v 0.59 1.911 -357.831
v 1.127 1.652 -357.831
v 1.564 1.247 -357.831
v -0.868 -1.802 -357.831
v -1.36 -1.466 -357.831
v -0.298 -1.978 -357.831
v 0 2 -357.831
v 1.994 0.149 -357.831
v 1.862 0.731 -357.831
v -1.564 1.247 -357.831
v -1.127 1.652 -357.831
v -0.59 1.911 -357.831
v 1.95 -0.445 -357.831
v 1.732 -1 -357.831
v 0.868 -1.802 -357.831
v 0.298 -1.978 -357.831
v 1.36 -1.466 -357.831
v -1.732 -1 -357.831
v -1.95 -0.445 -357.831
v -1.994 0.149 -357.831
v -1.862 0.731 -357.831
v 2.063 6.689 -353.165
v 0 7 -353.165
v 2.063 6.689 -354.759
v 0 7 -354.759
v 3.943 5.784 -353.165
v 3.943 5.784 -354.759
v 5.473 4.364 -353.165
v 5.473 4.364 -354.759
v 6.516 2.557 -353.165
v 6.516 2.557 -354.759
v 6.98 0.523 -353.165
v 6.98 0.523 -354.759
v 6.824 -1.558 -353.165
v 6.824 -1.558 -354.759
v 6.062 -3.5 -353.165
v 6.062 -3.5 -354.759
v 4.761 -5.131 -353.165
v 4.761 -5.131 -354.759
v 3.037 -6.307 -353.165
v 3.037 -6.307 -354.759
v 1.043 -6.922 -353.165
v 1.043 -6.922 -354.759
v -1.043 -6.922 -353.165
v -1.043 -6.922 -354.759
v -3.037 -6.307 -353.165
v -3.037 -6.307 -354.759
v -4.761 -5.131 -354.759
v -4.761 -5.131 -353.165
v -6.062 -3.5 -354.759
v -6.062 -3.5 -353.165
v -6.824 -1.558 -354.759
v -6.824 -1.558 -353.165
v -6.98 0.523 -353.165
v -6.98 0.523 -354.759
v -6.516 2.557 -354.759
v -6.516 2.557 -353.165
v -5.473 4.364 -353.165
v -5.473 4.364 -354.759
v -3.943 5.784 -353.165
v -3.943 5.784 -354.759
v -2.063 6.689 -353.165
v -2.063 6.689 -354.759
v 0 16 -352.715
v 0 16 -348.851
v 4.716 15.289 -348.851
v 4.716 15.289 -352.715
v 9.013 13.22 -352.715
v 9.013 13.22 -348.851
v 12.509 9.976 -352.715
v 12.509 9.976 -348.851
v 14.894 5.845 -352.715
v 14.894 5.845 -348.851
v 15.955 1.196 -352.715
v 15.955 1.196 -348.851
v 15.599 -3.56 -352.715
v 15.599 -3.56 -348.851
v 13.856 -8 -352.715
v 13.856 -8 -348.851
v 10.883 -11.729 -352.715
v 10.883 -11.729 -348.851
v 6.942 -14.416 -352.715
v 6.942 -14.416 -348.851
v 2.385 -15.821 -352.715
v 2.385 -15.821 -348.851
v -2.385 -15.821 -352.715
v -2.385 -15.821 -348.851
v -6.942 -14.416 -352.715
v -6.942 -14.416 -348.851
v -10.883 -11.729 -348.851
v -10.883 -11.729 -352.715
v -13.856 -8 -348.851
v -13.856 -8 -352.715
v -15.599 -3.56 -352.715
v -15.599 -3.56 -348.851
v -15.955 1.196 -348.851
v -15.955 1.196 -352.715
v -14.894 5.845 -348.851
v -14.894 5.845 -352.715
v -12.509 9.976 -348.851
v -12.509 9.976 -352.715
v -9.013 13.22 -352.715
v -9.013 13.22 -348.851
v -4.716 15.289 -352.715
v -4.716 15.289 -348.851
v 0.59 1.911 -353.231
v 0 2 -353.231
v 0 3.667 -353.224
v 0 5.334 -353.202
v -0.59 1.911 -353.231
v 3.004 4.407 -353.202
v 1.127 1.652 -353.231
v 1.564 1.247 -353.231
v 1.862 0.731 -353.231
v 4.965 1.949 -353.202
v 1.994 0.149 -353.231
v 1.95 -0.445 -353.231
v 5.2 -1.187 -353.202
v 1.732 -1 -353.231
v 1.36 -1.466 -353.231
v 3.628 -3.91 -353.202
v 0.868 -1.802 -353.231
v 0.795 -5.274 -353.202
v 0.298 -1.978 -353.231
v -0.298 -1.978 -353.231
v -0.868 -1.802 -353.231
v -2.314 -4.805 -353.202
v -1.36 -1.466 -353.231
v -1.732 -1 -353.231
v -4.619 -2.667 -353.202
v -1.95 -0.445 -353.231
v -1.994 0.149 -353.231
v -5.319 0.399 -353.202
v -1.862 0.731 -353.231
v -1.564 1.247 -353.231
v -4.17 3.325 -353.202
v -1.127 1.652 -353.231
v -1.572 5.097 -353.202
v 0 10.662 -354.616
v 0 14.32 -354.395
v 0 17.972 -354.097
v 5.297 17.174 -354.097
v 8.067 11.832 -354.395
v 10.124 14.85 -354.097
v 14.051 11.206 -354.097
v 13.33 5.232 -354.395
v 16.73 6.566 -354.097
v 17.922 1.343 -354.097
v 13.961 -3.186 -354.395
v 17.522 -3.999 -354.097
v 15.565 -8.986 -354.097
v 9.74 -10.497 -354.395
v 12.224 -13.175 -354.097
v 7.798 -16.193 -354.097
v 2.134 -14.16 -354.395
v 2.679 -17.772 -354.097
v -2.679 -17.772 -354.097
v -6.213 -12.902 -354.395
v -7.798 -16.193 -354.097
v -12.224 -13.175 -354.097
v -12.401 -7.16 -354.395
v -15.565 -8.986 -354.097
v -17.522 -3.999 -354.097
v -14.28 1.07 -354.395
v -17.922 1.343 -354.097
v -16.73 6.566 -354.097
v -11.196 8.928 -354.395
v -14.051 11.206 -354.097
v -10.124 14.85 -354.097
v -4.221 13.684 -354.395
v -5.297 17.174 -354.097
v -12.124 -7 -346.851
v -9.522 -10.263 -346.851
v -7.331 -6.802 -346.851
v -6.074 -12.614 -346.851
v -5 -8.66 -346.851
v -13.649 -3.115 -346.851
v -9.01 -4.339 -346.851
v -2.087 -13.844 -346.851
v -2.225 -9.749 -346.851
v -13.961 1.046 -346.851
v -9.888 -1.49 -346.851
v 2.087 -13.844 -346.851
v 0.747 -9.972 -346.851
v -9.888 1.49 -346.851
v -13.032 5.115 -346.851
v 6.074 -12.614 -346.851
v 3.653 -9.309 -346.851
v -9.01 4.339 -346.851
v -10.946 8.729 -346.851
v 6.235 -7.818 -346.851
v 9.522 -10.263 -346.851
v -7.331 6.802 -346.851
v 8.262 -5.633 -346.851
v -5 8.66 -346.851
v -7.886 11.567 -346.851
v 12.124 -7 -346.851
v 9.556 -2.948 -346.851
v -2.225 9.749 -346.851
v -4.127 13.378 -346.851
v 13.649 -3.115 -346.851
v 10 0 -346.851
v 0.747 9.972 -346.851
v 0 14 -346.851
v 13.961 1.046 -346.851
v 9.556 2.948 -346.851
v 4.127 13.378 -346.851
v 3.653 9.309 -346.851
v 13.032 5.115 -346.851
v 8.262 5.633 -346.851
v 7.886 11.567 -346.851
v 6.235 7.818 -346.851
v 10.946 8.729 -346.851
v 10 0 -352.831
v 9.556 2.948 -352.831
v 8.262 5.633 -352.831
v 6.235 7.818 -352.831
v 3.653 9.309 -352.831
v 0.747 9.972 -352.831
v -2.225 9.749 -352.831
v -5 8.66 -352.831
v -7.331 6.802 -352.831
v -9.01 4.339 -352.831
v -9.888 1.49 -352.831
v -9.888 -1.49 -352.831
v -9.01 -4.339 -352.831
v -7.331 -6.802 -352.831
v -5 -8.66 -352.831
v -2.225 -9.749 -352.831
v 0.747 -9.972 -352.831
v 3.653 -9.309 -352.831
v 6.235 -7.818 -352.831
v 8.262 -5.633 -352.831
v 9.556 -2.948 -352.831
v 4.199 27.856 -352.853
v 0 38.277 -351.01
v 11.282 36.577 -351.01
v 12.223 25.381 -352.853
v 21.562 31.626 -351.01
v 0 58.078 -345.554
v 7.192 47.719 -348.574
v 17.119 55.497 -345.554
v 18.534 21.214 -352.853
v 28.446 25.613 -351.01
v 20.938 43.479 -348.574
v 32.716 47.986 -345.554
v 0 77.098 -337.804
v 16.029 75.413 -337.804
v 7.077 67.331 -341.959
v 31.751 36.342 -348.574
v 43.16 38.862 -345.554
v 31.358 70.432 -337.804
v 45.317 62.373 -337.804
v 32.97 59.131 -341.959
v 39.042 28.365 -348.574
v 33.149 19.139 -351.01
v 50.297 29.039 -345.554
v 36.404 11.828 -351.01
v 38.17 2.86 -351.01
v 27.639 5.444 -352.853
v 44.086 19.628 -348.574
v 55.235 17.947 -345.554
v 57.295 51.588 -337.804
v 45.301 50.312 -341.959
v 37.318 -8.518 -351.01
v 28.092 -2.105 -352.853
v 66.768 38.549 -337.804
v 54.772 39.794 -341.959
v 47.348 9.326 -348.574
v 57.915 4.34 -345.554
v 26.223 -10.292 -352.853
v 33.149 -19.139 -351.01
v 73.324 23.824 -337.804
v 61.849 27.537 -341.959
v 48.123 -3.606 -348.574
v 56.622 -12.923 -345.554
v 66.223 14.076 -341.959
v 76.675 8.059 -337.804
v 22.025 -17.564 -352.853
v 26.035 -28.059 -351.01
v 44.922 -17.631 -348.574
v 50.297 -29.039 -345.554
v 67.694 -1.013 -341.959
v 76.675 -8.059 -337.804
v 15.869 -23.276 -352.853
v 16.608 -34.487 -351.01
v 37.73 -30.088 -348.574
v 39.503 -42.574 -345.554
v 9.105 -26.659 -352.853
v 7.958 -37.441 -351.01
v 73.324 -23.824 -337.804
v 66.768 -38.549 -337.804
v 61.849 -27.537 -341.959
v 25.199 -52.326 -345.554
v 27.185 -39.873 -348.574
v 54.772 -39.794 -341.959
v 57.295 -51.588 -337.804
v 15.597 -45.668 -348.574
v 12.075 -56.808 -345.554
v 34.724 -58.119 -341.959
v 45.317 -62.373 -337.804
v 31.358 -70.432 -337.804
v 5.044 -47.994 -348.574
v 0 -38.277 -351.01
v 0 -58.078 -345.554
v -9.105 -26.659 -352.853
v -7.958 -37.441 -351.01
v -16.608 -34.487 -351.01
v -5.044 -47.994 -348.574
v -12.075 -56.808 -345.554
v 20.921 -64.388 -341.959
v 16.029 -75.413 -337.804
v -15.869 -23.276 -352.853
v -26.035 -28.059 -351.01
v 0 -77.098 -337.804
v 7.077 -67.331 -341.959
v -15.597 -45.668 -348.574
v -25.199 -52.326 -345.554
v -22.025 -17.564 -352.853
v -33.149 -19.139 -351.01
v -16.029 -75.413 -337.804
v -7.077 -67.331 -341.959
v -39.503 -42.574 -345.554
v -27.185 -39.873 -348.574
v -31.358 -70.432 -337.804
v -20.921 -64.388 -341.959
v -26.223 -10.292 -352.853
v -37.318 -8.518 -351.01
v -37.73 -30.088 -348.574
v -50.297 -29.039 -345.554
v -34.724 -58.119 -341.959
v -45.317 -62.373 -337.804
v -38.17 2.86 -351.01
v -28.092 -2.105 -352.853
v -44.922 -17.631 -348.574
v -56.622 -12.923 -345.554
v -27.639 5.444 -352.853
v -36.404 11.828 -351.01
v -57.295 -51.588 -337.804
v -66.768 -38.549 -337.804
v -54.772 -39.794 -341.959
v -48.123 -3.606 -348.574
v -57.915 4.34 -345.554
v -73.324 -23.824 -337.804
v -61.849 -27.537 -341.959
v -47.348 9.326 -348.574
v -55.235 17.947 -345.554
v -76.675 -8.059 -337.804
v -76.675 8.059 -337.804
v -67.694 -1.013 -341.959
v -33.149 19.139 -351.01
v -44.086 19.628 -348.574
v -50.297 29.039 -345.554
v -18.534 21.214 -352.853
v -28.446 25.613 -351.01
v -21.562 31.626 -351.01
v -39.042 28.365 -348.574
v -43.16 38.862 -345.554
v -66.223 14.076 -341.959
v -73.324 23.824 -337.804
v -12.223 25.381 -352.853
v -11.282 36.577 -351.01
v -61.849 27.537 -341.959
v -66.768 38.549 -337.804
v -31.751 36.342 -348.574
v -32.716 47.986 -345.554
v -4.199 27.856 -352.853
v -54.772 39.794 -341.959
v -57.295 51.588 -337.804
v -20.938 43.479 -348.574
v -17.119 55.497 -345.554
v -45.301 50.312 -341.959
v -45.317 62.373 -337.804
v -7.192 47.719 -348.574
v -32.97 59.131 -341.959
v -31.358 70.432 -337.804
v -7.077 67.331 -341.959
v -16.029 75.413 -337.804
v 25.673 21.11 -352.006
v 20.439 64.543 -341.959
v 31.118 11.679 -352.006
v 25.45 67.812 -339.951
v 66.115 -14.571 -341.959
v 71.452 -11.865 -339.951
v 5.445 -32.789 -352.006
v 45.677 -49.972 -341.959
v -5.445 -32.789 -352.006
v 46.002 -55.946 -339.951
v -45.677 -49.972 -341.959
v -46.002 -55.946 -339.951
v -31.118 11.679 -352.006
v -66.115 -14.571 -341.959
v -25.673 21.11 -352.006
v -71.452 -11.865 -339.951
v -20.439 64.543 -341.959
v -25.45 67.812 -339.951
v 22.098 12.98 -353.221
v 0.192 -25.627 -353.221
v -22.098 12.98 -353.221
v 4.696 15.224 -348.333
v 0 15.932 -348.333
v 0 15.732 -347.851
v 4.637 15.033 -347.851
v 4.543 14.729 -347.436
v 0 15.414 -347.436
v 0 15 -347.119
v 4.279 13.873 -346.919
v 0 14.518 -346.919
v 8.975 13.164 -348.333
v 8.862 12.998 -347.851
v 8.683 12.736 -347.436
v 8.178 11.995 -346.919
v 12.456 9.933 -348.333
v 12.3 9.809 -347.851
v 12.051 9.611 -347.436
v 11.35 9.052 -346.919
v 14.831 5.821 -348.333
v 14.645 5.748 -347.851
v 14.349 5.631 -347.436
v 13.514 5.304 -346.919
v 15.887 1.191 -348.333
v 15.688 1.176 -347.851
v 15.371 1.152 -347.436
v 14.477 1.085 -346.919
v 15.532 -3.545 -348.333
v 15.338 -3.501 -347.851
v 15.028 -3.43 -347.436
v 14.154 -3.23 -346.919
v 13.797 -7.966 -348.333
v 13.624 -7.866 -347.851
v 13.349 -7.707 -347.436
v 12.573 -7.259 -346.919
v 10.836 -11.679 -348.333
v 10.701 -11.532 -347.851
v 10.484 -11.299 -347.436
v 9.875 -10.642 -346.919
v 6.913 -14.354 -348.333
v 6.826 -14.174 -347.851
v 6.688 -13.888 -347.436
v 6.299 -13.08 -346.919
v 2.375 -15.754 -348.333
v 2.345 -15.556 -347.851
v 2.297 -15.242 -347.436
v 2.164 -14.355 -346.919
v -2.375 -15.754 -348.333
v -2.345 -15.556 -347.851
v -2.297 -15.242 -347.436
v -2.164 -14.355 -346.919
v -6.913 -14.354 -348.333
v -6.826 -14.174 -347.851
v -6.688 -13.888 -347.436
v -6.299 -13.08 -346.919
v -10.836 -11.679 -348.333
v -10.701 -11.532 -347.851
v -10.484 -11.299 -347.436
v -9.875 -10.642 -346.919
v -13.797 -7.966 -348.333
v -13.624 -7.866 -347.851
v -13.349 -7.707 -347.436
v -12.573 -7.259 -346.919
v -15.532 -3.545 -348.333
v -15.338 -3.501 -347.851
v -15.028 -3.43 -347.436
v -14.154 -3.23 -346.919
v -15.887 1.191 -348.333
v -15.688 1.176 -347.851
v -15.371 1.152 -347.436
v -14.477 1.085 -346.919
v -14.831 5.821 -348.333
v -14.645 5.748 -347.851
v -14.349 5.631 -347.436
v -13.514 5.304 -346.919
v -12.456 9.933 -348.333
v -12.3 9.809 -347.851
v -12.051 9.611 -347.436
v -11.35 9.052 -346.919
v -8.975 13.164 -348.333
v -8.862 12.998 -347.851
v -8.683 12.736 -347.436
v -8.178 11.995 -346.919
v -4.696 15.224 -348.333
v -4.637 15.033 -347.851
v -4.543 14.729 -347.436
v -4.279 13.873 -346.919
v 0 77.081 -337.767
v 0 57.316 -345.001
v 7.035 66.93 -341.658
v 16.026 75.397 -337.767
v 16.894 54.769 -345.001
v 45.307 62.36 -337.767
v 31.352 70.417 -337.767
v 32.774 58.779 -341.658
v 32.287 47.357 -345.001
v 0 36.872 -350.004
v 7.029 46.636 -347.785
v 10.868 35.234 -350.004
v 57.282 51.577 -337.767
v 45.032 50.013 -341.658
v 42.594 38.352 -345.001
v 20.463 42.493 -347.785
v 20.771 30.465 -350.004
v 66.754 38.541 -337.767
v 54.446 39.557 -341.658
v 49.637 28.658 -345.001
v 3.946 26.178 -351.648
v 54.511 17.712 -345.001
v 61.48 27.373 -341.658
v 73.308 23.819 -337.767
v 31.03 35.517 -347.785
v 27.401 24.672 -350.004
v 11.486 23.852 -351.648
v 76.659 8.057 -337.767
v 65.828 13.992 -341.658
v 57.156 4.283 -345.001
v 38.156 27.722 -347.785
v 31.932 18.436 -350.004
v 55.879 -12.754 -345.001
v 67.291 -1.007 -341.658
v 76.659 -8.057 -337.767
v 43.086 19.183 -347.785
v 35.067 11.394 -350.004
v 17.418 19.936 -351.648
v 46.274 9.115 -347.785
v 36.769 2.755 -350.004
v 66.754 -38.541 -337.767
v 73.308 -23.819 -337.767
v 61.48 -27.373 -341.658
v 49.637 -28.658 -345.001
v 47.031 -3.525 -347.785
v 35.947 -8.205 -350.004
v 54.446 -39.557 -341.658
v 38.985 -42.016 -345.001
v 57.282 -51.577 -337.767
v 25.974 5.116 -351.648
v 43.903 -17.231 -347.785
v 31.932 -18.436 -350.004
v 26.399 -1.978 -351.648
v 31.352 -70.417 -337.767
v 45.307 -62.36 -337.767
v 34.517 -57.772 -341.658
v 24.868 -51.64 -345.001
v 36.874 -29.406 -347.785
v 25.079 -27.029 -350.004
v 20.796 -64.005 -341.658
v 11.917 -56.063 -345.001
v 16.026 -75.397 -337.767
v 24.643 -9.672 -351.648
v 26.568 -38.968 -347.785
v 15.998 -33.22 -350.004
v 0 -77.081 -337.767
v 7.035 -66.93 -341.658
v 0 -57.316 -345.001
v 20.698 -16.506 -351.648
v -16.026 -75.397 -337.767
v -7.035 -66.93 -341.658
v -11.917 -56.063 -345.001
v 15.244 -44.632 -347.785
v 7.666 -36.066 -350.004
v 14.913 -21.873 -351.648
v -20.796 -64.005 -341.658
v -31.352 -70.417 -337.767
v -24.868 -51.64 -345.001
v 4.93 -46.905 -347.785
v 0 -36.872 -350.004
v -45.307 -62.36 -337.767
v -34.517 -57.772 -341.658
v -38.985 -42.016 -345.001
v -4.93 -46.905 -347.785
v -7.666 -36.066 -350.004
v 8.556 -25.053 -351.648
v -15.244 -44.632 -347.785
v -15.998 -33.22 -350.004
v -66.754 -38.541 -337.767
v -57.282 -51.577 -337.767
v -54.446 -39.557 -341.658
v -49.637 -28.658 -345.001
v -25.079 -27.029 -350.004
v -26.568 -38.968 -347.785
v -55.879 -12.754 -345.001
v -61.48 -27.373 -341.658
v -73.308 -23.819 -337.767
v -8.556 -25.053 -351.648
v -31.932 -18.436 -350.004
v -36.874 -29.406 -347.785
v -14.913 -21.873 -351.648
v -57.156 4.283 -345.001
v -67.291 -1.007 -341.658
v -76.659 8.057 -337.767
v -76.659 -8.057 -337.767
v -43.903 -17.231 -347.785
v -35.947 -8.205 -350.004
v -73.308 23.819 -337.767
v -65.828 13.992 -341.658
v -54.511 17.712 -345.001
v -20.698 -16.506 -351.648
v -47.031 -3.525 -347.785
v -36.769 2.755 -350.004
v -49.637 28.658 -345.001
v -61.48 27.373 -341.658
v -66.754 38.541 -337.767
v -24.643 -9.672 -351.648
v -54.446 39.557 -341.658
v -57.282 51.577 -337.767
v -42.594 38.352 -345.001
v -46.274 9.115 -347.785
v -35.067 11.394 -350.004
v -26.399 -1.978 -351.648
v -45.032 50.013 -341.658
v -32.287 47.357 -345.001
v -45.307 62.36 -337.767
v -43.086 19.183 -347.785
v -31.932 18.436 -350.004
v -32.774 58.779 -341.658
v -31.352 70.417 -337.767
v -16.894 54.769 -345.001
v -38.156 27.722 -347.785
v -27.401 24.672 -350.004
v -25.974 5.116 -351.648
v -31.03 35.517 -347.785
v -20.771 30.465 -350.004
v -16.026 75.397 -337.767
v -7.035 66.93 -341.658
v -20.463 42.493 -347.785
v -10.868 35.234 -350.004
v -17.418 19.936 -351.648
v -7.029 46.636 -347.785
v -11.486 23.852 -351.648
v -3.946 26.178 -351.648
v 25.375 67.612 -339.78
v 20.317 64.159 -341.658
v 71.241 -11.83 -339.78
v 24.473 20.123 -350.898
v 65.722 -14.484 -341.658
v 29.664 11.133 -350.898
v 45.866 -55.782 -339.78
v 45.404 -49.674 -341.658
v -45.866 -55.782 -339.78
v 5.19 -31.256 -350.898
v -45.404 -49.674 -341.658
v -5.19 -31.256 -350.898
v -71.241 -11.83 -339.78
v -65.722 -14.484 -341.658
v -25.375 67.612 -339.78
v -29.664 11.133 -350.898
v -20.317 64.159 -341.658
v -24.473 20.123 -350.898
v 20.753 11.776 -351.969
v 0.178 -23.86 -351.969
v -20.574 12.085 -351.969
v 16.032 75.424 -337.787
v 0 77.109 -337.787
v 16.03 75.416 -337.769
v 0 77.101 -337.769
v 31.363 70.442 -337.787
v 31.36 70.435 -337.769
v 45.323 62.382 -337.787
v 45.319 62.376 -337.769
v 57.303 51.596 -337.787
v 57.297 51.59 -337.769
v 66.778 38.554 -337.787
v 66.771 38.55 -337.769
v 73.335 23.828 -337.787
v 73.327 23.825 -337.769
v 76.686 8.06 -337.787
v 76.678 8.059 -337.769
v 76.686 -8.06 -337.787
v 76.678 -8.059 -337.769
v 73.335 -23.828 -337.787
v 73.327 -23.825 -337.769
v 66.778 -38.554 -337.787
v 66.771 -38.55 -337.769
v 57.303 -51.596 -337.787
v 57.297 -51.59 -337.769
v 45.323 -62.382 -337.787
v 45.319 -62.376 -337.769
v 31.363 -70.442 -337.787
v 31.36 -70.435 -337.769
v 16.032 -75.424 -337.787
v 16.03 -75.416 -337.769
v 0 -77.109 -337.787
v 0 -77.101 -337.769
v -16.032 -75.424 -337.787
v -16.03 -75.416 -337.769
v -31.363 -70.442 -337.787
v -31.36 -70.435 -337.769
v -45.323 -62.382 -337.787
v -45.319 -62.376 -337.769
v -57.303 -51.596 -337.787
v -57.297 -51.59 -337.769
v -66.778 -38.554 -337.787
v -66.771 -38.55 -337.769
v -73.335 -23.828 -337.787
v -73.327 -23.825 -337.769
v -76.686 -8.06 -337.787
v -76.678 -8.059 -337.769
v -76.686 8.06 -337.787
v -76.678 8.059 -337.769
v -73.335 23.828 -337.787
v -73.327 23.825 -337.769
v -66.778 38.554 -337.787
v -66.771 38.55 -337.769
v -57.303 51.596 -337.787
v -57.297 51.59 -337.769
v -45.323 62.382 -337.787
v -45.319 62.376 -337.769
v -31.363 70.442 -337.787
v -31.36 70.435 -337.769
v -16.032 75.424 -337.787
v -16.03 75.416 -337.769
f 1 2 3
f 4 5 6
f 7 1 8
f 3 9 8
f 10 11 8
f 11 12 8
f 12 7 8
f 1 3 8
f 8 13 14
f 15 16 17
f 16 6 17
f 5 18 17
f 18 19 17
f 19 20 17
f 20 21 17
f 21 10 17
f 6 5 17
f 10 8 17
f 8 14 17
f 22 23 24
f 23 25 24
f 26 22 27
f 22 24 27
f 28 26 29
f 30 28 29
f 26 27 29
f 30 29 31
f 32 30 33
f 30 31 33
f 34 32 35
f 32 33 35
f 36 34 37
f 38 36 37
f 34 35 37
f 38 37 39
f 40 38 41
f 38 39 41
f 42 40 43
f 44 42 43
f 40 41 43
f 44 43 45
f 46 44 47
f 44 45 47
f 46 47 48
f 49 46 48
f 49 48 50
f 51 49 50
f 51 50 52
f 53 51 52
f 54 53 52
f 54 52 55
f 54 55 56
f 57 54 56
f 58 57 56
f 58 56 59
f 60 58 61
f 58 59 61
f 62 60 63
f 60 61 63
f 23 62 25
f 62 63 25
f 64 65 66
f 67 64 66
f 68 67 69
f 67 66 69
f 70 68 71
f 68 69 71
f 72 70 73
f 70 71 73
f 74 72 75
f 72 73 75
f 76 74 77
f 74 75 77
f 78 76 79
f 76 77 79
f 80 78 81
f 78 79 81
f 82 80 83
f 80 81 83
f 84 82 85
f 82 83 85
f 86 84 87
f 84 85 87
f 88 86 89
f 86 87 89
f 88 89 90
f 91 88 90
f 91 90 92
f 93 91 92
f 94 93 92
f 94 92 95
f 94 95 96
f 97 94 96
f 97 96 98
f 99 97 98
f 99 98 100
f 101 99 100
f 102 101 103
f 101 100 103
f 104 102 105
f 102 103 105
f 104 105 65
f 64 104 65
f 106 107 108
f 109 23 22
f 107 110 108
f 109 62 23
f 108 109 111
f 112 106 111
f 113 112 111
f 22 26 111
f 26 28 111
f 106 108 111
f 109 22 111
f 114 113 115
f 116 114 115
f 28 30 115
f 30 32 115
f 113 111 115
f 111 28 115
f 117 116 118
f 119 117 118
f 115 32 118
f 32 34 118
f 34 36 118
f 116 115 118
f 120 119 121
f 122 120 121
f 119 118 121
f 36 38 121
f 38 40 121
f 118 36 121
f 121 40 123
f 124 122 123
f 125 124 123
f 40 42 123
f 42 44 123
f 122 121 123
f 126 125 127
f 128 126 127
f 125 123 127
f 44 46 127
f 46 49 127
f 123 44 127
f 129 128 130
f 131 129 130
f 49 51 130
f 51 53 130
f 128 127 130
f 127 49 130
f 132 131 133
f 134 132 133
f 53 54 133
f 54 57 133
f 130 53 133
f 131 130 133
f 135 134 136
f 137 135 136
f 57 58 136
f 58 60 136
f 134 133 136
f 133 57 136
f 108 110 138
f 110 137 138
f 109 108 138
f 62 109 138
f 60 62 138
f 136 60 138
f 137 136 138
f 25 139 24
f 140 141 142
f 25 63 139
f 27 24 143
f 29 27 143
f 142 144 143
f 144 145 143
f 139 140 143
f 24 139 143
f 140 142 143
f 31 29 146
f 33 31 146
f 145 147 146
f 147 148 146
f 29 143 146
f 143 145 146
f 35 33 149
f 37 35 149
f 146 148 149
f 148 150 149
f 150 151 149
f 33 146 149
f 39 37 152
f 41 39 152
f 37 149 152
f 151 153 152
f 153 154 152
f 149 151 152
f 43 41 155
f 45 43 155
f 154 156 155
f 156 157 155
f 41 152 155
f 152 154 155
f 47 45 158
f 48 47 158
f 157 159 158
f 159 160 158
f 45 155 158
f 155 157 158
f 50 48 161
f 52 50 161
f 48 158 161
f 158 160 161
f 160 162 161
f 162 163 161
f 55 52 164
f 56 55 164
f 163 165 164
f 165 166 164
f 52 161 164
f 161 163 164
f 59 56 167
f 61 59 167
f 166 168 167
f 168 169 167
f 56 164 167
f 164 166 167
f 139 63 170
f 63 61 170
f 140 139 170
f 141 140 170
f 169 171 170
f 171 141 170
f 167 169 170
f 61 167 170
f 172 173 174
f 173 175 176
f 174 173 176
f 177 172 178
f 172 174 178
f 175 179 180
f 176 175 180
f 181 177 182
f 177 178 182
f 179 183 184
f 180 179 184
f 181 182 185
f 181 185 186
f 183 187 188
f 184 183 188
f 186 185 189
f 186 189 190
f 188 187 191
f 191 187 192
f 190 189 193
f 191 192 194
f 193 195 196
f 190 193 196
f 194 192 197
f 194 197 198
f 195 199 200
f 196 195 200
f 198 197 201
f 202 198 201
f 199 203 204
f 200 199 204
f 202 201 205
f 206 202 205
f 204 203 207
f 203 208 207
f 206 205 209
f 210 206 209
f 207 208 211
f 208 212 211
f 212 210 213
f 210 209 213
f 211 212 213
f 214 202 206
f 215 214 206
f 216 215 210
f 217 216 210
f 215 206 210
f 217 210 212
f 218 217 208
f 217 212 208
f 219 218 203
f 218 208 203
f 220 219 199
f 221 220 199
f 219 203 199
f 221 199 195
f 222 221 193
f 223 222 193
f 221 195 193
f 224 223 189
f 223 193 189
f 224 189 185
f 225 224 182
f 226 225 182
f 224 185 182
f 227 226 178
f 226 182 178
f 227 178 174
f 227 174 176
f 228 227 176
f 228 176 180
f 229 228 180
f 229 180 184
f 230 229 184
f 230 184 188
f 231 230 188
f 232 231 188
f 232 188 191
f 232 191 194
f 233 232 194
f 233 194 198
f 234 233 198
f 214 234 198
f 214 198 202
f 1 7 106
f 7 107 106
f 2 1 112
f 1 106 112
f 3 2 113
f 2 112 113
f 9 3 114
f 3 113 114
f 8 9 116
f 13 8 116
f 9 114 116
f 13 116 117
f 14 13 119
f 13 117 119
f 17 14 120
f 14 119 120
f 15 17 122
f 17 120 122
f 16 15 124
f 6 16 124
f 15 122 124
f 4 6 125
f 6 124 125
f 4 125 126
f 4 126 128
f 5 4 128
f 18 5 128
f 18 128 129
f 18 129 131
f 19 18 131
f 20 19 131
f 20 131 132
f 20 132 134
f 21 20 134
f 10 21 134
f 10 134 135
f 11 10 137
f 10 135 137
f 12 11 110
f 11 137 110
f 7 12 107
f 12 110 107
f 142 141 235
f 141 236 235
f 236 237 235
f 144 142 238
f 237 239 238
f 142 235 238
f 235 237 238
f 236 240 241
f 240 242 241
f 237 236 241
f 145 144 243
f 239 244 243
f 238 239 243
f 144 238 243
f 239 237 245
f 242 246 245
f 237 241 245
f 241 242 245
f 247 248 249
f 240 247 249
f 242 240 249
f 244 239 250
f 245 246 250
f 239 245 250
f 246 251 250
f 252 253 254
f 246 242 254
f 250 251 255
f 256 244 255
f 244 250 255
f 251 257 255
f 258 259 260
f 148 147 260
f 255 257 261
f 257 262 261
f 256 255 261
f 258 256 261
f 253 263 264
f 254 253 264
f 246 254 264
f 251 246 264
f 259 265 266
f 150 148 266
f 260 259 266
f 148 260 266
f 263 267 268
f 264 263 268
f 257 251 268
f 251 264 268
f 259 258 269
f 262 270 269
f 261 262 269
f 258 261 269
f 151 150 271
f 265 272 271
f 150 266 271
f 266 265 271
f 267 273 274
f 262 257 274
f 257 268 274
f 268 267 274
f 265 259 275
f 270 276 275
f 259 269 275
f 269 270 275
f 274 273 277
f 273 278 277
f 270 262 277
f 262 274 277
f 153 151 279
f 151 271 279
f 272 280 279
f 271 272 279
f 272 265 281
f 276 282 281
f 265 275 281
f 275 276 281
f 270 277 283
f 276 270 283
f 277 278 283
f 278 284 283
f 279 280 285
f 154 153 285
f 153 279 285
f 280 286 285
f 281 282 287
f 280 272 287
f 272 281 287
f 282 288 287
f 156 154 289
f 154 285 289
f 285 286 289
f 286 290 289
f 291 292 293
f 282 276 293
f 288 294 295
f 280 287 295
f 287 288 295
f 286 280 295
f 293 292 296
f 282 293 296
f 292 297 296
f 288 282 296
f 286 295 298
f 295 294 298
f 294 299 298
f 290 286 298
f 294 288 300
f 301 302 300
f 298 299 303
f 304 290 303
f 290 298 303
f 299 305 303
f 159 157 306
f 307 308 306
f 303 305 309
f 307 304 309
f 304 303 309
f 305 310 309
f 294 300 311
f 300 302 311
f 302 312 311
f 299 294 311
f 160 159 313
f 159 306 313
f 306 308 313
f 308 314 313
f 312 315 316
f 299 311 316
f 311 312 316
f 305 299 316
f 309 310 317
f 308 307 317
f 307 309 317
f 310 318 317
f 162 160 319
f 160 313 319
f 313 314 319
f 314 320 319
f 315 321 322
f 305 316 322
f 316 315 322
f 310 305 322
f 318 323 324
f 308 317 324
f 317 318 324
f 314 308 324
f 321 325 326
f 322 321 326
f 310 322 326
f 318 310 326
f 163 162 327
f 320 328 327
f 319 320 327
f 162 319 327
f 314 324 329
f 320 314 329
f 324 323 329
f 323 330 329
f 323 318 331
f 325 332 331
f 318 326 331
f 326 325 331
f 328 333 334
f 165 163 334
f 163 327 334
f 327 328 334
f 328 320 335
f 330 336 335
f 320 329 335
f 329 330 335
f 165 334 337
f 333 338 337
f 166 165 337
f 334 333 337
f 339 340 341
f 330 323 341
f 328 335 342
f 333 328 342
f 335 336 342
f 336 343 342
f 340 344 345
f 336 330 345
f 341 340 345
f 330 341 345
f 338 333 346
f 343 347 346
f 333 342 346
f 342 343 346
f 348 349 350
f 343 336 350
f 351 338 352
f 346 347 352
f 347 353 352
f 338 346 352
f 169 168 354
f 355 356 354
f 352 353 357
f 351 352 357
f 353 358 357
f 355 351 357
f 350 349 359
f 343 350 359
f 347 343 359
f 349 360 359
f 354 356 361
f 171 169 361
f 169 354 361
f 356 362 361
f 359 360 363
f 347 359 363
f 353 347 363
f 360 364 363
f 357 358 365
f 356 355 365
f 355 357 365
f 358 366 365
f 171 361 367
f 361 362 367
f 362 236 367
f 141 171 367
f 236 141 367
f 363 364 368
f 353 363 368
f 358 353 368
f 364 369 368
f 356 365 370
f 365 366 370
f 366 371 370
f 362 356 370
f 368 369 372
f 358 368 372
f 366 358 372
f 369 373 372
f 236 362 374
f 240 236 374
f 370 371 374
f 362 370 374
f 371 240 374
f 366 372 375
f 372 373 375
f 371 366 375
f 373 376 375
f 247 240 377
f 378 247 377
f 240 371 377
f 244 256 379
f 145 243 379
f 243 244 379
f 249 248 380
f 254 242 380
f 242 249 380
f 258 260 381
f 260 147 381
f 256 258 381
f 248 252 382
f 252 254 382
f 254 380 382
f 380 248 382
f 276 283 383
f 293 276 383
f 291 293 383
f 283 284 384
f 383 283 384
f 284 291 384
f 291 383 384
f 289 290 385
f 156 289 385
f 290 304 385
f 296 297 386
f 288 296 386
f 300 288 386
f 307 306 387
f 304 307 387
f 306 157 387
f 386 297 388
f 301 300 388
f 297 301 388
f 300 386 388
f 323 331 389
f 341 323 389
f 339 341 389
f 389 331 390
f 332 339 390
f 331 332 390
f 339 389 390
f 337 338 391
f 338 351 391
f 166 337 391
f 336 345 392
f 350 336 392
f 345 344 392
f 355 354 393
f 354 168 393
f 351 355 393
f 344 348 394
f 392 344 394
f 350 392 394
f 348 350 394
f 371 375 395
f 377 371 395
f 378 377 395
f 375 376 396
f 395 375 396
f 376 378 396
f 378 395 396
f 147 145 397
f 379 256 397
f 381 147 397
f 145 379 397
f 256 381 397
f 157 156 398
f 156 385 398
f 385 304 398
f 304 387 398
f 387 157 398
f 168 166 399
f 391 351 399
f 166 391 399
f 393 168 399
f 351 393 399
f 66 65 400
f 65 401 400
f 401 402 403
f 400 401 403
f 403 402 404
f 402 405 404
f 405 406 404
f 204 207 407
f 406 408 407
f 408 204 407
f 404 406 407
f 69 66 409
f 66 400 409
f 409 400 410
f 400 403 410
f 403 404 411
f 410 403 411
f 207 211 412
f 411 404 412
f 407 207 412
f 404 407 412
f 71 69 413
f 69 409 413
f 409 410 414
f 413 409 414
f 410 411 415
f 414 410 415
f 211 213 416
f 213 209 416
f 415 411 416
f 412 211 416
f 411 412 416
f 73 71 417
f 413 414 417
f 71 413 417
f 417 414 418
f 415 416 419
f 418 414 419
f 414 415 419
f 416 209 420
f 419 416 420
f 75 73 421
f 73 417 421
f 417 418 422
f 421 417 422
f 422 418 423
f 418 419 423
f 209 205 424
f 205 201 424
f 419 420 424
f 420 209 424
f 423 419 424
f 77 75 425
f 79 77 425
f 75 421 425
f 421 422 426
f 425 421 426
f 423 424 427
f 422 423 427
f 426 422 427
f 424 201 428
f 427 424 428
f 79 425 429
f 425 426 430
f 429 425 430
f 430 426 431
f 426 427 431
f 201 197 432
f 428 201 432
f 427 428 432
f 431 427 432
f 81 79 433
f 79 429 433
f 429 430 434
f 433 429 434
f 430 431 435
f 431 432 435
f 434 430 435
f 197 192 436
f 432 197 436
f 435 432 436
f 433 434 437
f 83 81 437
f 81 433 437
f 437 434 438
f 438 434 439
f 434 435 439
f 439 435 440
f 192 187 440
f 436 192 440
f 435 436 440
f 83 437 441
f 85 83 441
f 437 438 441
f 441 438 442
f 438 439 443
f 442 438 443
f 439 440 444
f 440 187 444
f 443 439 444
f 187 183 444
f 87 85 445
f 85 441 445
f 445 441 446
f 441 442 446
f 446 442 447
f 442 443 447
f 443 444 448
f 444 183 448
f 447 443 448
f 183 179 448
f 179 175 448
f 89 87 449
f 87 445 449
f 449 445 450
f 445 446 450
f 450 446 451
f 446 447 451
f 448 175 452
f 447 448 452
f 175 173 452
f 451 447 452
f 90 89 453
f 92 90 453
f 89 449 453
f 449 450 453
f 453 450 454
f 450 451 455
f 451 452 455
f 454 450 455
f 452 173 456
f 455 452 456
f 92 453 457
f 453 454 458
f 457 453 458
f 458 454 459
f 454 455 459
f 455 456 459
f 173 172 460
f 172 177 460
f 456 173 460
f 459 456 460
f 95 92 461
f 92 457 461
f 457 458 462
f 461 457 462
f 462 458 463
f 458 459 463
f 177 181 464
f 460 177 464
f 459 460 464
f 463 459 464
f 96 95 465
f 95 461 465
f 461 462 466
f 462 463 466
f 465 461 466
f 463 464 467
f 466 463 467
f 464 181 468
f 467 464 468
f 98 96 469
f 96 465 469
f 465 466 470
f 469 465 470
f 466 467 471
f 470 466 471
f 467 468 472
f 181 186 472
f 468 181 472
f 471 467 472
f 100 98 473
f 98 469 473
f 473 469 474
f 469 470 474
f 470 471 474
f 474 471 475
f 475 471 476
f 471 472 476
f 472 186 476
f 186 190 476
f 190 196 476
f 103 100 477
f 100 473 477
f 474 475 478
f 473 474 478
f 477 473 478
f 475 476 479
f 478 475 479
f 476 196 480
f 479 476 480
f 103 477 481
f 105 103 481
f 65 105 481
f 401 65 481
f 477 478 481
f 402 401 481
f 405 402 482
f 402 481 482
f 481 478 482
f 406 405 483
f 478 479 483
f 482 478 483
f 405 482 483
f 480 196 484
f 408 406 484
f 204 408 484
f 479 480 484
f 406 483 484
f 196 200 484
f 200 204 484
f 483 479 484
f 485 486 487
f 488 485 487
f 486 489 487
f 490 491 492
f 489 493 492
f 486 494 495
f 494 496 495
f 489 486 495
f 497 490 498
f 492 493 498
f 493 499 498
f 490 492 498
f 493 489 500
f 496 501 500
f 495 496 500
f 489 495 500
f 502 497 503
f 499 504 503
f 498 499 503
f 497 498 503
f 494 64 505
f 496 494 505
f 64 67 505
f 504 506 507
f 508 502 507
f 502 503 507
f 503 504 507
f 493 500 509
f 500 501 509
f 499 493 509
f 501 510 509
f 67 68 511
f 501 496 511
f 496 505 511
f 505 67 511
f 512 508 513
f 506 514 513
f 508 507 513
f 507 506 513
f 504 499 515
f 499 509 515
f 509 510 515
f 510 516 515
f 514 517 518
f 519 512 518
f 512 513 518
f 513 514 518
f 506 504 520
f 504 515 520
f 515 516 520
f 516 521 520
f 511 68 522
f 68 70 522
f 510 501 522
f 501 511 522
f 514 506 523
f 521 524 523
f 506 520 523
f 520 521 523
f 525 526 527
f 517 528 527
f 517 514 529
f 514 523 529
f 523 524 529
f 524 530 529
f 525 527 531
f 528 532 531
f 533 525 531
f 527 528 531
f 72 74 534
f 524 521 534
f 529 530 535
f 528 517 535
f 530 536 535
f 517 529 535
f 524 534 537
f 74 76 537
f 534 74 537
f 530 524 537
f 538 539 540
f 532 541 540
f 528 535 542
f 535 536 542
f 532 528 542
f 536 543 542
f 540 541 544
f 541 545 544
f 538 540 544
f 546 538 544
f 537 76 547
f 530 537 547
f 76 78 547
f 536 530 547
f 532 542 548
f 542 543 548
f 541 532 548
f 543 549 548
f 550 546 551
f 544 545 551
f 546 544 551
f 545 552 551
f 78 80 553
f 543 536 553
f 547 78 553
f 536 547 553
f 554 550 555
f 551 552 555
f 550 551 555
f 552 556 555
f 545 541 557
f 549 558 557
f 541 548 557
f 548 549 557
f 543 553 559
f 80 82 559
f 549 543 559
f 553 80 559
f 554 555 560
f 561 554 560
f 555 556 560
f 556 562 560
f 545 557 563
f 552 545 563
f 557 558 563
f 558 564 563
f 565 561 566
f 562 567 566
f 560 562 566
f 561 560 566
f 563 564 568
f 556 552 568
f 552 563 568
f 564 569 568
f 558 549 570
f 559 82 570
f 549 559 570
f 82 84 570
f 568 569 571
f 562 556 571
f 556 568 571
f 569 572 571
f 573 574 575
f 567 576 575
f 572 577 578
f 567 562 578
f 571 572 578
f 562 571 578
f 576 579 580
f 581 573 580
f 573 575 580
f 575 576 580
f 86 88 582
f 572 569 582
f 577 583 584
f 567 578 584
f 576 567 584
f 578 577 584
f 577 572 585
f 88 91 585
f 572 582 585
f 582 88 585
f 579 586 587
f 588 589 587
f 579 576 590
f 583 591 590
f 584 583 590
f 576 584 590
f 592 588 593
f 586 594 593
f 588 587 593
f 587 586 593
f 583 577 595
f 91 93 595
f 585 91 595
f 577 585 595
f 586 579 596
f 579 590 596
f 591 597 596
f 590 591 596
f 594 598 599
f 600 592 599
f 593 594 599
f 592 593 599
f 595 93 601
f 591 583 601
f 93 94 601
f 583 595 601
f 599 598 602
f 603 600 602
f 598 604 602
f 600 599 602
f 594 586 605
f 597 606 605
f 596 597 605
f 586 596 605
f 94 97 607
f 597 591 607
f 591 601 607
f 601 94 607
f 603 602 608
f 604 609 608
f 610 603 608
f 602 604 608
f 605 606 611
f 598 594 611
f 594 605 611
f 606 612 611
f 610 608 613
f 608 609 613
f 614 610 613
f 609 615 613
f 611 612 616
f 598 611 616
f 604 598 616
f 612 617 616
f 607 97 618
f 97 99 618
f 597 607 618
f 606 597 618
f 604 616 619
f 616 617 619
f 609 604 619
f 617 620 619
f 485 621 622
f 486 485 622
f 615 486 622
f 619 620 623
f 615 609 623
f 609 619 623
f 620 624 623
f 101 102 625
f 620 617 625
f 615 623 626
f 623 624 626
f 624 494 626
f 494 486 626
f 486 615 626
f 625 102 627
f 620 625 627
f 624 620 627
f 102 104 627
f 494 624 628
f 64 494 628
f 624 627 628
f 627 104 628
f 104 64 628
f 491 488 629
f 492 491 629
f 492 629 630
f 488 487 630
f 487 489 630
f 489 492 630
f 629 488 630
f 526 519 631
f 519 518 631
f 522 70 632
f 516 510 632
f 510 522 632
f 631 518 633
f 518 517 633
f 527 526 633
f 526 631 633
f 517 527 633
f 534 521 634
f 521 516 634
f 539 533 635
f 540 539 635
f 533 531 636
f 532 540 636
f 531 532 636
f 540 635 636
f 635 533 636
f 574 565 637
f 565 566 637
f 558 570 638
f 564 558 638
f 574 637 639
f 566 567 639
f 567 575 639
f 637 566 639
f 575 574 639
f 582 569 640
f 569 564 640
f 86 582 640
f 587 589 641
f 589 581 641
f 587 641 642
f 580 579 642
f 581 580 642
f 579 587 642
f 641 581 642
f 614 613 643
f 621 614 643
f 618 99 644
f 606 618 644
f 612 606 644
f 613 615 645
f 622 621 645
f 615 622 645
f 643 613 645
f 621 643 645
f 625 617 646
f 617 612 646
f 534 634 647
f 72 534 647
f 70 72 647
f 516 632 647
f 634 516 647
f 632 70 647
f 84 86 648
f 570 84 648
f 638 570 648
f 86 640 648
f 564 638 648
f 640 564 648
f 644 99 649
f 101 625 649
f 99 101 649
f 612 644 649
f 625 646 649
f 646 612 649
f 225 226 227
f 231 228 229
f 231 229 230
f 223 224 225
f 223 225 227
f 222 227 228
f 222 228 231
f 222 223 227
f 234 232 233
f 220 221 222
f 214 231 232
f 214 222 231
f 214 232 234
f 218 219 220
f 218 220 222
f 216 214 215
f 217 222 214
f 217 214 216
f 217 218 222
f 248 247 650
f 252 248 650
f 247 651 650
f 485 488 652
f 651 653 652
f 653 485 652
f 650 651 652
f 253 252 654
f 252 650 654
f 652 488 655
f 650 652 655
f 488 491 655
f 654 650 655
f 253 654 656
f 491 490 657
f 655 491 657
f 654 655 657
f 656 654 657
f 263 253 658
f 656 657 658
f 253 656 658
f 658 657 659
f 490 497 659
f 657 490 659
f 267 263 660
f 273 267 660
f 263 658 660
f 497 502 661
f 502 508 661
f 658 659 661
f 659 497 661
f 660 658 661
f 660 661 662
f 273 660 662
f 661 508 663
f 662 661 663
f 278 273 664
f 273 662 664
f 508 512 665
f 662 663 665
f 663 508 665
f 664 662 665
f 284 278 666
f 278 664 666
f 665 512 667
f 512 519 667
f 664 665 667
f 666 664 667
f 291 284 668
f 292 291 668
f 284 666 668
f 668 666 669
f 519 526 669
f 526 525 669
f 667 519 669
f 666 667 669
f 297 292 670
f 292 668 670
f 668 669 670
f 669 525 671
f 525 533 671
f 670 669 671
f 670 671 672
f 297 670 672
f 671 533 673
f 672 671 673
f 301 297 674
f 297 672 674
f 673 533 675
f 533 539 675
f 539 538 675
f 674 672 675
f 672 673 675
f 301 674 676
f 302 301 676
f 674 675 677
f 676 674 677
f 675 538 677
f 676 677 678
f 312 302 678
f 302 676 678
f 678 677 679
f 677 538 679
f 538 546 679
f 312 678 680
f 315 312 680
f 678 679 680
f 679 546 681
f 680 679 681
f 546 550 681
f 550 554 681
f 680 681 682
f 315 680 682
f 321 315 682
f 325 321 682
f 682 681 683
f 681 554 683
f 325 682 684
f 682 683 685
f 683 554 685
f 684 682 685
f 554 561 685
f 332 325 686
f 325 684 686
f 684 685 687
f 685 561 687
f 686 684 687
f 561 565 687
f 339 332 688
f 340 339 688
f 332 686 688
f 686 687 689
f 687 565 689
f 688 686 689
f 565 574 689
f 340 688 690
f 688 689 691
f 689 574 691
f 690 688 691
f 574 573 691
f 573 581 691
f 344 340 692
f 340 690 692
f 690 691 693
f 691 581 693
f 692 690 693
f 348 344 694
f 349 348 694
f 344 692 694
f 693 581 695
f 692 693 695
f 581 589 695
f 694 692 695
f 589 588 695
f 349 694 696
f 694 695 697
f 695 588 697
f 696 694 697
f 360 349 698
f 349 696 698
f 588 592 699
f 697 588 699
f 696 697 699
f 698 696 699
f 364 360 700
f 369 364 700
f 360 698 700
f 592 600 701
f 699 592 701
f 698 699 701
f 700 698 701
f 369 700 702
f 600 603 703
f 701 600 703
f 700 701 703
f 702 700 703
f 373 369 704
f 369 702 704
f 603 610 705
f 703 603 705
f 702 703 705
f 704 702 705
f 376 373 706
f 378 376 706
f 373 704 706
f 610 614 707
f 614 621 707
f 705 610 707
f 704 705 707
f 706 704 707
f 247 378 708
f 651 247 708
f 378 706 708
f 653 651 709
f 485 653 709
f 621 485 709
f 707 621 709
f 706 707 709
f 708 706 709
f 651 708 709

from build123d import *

# Parameters (mm, degrees)
SCALE2_SCALE       = 0.2
SKETCH3_R          = 10
CUT_EXTRUDE1_DEPTH = 65


with BuildPart() as part:
    # Sketch2 → Revolve1 (revolve)
    with BuildSketch(Plane(origin=(0, 0, 0), x_dir=(0, 0, -1), z_dir=(1, 0, 0))):
        with BuildLine():
            Line((48, 10), (48, 0))
            Line((48, 0), (398, 0))
            Line((398, 0), (398, 10))
            Line((398, 10), (375, 10))
            ThreePointArc((375, 10), (374.354166119, 45.023810067), (372.417542586, 80))
            Line((372.417542586, 80), (353.097307046, 80))
            ThreePointArc((353.097307046, 80), (346.026239234, 77.071067812), (343.097307046, 70))
            Line((343.097307046, 70), (343.097307046, 35))
            Line((343.097307046, 35), (366.168534539, 35))
            ThreePointArc((366.168534539, 35), (363.285489503, 22.450350148), (360, 10))
            Line((360, 10), (48, 10))
        make_face()
    revolve(axis=Axis((0, 0, 0), (0, 0, -1)))

    # Sketch2<4> → Revolve4 (revolve)
    with BuildSketch(Plane(origin=(0, 0, 0), x_dir=(0, 0, -1), z_dir=(1, 0, 0))):
        with BuildLine():
            Line((374.670995661, 35), (382.64097315, 35))
            ThreePointArc((382.64097315, 35), (381.418152433, 62.457340976), (379.329217835, 89.8623992))
            ThreePointArc((379.329217835, 89.8623992), (351.714253626, 241.290271622), (297.862368165, 385.487918021))
            ThreePointArc((297.862368165, 385.487918021), (297.730815988, 385.535846448), (297.680286408, 385.405271294))
            ThreePointArc((297.680286408, 385.405271294), (347.771435249, 235.81602753), (372.417542586, 80))
            ThreePointArc((372.417542586, 80), (373.100657211, 70.04284966), (373.679127274, 60.079072219))
            ThreePointArc((373.679127274, 60.079072219), (374.257887656, 47.542811856), (374.670995661, 35))
        make_face()
    revolve(axis=Axis((0, 0, 0), (0, 0, -1)))


with BuildPart() as part_1:
    # Scale2: scaled about (0, 0, -347.788992614)
    add(part.part.scale(SCALE2_SCALE).moved(Location((0, 0, -278.231194091))))

    # Sketch3 → Cut-Extrude1 (cut)
    with BuildSketch(Plane.XY.offset(-287.831194091)):
        Circle(SKETCH3_R)
    extrude(amount=-CUT_EXTRUDE1_DEPTH, mode=Mode.SUBTRACT)


solid = part_1.part
